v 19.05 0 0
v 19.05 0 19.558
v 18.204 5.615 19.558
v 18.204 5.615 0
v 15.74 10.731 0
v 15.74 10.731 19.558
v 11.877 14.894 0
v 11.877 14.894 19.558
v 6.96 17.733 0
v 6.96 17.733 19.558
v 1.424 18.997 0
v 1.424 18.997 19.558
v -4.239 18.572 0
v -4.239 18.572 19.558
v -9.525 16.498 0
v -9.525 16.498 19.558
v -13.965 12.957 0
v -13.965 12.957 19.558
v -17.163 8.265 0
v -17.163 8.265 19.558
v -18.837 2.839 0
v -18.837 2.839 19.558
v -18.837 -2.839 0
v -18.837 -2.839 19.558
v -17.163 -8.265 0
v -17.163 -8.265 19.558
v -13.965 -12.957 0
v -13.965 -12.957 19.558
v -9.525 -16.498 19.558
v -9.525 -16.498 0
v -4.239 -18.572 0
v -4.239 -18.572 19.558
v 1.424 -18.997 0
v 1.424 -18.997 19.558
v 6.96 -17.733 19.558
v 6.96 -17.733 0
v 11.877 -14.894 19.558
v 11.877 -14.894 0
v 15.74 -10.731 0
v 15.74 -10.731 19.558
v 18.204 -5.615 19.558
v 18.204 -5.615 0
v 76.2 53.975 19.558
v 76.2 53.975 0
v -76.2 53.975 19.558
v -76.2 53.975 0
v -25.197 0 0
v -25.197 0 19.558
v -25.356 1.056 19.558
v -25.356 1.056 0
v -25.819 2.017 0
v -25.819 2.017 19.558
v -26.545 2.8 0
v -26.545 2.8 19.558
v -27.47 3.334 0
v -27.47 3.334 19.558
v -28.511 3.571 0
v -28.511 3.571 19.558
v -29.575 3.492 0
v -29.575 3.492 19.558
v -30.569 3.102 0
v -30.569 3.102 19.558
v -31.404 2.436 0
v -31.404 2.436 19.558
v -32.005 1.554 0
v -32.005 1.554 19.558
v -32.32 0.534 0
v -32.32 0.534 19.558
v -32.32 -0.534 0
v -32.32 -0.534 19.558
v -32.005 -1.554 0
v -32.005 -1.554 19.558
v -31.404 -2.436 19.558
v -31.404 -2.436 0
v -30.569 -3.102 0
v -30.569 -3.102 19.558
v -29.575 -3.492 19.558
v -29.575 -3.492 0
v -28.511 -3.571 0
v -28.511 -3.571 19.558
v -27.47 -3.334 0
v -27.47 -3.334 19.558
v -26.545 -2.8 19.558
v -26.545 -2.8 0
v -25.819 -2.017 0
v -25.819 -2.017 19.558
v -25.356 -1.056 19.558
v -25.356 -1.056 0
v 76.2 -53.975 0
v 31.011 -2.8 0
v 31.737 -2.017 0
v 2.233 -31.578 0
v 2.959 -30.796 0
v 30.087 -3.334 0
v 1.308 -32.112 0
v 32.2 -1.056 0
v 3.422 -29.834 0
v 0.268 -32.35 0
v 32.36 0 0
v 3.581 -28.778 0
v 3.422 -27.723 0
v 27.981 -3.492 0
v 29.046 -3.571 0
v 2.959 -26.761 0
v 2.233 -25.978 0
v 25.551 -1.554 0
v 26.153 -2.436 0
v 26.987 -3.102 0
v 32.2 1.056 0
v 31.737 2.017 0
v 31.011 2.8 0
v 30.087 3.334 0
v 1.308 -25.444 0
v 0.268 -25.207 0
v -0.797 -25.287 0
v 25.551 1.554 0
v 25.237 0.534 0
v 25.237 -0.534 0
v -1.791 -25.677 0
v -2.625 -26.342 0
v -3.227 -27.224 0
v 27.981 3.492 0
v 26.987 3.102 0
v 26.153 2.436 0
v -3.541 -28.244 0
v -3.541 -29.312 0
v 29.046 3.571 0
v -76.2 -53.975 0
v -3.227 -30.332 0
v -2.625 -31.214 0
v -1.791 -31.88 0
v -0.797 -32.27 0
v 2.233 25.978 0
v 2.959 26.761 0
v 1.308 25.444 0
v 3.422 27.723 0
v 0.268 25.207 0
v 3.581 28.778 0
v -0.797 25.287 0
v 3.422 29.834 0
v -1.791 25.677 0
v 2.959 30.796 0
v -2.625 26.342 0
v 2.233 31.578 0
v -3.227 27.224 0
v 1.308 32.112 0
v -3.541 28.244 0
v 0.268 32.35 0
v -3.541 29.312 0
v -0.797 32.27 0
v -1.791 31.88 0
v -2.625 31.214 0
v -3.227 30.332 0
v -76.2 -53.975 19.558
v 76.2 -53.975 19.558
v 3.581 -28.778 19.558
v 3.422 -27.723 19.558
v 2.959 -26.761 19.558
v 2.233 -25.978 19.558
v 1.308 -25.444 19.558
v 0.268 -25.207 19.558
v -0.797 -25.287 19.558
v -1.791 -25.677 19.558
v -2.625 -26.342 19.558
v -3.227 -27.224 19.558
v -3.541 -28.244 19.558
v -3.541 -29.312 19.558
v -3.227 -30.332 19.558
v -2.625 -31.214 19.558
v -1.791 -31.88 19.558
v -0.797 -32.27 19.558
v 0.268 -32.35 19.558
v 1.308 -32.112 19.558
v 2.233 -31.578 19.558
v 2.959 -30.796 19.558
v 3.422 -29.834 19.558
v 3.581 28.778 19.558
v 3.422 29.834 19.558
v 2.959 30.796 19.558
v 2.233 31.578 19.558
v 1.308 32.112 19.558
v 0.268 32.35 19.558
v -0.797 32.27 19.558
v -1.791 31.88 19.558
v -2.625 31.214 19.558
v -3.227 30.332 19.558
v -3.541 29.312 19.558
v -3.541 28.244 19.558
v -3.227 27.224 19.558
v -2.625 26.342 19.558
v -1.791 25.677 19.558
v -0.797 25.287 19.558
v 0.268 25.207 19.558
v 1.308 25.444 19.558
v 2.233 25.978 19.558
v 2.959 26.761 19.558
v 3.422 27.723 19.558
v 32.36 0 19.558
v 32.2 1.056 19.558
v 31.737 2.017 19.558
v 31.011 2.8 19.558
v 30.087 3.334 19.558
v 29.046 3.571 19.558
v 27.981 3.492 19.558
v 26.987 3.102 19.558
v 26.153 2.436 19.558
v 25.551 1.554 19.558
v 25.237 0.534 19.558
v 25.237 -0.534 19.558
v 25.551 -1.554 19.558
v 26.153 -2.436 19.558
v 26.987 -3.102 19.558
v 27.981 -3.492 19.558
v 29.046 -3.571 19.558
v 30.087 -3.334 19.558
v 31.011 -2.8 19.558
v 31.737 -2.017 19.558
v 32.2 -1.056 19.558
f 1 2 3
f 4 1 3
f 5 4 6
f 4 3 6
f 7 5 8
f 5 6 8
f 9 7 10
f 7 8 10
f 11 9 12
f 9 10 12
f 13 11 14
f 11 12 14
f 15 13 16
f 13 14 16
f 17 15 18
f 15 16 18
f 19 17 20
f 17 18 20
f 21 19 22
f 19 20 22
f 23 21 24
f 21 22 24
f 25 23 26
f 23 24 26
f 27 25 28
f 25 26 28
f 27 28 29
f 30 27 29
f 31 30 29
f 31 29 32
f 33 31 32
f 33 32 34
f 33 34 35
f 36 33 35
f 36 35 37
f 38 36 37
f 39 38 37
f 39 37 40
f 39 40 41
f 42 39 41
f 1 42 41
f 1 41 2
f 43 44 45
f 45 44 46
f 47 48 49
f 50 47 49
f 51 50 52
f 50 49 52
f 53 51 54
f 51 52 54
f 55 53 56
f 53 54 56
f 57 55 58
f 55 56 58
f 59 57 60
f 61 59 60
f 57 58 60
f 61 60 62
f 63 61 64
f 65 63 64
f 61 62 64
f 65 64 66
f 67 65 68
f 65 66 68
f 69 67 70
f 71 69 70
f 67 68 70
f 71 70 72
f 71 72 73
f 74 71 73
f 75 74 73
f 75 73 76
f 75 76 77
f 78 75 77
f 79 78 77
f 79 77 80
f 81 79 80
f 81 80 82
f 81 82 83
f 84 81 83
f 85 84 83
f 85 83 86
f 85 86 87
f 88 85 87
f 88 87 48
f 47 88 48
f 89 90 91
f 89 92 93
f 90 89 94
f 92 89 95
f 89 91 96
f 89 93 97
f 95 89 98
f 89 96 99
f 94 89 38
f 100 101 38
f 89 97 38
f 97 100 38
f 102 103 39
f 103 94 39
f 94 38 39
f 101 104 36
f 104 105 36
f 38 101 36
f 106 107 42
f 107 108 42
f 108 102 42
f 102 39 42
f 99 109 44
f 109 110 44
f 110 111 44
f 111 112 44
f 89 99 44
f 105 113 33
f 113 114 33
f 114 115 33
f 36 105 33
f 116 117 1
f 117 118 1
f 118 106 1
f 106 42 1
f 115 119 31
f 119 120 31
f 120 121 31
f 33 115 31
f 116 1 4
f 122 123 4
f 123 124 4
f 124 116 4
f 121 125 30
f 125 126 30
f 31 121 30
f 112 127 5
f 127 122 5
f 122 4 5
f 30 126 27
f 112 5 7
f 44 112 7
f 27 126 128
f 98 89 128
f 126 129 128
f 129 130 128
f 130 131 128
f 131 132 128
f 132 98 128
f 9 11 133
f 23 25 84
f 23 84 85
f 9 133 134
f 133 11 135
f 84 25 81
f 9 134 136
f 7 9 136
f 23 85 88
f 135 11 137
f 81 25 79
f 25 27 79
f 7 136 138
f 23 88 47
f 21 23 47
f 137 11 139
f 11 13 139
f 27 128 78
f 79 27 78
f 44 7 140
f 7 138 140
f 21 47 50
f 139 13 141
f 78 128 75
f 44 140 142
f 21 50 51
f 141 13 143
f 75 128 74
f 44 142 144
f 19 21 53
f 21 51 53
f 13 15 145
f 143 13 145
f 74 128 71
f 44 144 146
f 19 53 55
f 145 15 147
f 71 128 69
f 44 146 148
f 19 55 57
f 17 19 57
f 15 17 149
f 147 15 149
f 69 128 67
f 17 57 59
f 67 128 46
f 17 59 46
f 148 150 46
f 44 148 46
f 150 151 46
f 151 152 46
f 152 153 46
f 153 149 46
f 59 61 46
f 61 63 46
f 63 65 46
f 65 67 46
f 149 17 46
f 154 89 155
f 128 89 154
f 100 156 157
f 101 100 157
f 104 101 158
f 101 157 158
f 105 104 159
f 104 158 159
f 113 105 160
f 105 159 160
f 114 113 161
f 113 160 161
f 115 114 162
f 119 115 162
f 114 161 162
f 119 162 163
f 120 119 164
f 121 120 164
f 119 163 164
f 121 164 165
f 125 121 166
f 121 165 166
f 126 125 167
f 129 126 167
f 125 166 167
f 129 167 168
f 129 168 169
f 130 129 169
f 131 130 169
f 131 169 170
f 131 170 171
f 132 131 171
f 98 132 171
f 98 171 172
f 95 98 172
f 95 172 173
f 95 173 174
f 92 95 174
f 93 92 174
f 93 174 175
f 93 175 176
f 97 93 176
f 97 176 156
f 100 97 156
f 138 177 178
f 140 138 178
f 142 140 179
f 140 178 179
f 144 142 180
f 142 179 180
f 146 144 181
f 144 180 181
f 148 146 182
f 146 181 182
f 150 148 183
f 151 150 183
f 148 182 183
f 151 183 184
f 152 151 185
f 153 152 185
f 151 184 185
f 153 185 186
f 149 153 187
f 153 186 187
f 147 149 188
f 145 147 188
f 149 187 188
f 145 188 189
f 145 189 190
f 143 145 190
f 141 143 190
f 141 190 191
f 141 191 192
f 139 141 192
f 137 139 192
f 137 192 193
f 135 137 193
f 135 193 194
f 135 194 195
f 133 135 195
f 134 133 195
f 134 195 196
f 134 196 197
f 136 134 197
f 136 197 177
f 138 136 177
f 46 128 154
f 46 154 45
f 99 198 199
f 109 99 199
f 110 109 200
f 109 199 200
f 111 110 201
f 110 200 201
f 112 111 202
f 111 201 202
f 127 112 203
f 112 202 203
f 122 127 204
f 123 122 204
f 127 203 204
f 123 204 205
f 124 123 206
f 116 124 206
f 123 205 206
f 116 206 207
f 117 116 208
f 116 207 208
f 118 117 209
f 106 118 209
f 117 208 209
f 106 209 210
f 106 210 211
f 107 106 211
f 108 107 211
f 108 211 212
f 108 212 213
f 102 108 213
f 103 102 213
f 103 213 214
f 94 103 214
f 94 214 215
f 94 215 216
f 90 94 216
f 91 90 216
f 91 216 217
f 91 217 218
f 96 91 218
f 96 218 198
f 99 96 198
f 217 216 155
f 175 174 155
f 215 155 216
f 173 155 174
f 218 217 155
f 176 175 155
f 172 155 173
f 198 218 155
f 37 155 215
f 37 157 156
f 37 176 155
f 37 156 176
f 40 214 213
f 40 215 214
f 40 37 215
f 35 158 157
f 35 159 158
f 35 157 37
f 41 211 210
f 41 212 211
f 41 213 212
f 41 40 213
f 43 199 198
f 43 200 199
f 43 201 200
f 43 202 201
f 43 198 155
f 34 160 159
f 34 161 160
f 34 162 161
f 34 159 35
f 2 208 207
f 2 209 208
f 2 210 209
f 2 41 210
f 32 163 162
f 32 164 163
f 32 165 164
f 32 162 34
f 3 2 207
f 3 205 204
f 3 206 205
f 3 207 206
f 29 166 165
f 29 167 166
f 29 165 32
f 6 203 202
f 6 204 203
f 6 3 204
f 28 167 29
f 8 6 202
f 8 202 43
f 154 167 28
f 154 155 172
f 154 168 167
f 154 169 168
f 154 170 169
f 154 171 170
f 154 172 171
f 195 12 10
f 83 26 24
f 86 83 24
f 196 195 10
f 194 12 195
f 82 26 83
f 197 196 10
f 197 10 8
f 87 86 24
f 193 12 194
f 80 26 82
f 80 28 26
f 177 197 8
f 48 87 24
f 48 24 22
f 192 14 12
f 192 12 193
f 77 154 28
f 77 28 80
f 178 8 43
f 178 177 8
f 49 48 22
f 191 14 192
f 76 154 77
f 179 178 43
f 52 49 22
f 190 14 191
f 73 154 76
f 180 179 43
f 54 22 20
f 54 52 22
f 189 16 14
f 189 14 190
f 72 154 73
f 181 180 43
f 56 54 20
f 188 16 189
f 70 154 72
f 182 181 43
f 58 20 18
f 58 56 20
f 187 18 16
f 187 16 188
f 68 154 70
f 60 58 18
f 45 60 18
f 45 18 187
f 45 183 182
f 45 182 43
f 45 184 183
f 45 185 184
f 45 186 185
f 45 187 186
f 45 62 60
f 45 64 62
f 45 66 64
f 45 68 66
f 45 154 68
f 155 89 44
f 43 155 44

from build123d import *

# Parameters (mm, degrees)
SKETCH2_W           = 107.95
SKETCH2_H           = 152.4
BOSS_EXTRUDE1_DEPTH = 19.558
SKETCH33_R          = 19.05
CUT_EXTRUDE4_DEPTH  = 96.405744004
SKETCH35_R          = 3.5814
CUT_EXTRUDE5_DEPTH  = 96.405744004


with BuildPart() as part:
    # Sketch2 → Boss-Extrude1 (new body)
    with BuildSketch(Plane(origin=(0, 0, 0), x_dir=(0, 1, 0), z_dir=(0, 0, 1))):
        Rectangle(SKETCH2_W, SKETCH2_H)
    extrude(amount=BOSS_EXTRUDE1_DEPTH)

    # Sketch33 → Cut-Extrude4 (cut, through all)
    with BuildSketch(Plane.XY.offset(19.558)):
        Circle(SKETCH33_R)
    extrude(amount=-CUT_EXTRUDE4_DEPTH, mode=Mode.SUBTRACT)

    # Sketch35 → Cut-Extrude5 (cut, through all)
    with BuildSketch(Plane.XY.offset(19.558)):
        with Locations((0, 28.7782)):
            Circle(SKETCH35_R)
        with Locations((28.7782, 0)):
            Circle(SKETCH35_R)
        with Locations((0, -28.7782)):
            Circle(SKETCH35_R)
        with Locations((-28.7782, 0)):
            Circle(SKETCH35_R)
    extrude(amount=-CUT_EXTRUDE5_DEPTH, mode=Mode.SUBTRACT)


solid = part.part
